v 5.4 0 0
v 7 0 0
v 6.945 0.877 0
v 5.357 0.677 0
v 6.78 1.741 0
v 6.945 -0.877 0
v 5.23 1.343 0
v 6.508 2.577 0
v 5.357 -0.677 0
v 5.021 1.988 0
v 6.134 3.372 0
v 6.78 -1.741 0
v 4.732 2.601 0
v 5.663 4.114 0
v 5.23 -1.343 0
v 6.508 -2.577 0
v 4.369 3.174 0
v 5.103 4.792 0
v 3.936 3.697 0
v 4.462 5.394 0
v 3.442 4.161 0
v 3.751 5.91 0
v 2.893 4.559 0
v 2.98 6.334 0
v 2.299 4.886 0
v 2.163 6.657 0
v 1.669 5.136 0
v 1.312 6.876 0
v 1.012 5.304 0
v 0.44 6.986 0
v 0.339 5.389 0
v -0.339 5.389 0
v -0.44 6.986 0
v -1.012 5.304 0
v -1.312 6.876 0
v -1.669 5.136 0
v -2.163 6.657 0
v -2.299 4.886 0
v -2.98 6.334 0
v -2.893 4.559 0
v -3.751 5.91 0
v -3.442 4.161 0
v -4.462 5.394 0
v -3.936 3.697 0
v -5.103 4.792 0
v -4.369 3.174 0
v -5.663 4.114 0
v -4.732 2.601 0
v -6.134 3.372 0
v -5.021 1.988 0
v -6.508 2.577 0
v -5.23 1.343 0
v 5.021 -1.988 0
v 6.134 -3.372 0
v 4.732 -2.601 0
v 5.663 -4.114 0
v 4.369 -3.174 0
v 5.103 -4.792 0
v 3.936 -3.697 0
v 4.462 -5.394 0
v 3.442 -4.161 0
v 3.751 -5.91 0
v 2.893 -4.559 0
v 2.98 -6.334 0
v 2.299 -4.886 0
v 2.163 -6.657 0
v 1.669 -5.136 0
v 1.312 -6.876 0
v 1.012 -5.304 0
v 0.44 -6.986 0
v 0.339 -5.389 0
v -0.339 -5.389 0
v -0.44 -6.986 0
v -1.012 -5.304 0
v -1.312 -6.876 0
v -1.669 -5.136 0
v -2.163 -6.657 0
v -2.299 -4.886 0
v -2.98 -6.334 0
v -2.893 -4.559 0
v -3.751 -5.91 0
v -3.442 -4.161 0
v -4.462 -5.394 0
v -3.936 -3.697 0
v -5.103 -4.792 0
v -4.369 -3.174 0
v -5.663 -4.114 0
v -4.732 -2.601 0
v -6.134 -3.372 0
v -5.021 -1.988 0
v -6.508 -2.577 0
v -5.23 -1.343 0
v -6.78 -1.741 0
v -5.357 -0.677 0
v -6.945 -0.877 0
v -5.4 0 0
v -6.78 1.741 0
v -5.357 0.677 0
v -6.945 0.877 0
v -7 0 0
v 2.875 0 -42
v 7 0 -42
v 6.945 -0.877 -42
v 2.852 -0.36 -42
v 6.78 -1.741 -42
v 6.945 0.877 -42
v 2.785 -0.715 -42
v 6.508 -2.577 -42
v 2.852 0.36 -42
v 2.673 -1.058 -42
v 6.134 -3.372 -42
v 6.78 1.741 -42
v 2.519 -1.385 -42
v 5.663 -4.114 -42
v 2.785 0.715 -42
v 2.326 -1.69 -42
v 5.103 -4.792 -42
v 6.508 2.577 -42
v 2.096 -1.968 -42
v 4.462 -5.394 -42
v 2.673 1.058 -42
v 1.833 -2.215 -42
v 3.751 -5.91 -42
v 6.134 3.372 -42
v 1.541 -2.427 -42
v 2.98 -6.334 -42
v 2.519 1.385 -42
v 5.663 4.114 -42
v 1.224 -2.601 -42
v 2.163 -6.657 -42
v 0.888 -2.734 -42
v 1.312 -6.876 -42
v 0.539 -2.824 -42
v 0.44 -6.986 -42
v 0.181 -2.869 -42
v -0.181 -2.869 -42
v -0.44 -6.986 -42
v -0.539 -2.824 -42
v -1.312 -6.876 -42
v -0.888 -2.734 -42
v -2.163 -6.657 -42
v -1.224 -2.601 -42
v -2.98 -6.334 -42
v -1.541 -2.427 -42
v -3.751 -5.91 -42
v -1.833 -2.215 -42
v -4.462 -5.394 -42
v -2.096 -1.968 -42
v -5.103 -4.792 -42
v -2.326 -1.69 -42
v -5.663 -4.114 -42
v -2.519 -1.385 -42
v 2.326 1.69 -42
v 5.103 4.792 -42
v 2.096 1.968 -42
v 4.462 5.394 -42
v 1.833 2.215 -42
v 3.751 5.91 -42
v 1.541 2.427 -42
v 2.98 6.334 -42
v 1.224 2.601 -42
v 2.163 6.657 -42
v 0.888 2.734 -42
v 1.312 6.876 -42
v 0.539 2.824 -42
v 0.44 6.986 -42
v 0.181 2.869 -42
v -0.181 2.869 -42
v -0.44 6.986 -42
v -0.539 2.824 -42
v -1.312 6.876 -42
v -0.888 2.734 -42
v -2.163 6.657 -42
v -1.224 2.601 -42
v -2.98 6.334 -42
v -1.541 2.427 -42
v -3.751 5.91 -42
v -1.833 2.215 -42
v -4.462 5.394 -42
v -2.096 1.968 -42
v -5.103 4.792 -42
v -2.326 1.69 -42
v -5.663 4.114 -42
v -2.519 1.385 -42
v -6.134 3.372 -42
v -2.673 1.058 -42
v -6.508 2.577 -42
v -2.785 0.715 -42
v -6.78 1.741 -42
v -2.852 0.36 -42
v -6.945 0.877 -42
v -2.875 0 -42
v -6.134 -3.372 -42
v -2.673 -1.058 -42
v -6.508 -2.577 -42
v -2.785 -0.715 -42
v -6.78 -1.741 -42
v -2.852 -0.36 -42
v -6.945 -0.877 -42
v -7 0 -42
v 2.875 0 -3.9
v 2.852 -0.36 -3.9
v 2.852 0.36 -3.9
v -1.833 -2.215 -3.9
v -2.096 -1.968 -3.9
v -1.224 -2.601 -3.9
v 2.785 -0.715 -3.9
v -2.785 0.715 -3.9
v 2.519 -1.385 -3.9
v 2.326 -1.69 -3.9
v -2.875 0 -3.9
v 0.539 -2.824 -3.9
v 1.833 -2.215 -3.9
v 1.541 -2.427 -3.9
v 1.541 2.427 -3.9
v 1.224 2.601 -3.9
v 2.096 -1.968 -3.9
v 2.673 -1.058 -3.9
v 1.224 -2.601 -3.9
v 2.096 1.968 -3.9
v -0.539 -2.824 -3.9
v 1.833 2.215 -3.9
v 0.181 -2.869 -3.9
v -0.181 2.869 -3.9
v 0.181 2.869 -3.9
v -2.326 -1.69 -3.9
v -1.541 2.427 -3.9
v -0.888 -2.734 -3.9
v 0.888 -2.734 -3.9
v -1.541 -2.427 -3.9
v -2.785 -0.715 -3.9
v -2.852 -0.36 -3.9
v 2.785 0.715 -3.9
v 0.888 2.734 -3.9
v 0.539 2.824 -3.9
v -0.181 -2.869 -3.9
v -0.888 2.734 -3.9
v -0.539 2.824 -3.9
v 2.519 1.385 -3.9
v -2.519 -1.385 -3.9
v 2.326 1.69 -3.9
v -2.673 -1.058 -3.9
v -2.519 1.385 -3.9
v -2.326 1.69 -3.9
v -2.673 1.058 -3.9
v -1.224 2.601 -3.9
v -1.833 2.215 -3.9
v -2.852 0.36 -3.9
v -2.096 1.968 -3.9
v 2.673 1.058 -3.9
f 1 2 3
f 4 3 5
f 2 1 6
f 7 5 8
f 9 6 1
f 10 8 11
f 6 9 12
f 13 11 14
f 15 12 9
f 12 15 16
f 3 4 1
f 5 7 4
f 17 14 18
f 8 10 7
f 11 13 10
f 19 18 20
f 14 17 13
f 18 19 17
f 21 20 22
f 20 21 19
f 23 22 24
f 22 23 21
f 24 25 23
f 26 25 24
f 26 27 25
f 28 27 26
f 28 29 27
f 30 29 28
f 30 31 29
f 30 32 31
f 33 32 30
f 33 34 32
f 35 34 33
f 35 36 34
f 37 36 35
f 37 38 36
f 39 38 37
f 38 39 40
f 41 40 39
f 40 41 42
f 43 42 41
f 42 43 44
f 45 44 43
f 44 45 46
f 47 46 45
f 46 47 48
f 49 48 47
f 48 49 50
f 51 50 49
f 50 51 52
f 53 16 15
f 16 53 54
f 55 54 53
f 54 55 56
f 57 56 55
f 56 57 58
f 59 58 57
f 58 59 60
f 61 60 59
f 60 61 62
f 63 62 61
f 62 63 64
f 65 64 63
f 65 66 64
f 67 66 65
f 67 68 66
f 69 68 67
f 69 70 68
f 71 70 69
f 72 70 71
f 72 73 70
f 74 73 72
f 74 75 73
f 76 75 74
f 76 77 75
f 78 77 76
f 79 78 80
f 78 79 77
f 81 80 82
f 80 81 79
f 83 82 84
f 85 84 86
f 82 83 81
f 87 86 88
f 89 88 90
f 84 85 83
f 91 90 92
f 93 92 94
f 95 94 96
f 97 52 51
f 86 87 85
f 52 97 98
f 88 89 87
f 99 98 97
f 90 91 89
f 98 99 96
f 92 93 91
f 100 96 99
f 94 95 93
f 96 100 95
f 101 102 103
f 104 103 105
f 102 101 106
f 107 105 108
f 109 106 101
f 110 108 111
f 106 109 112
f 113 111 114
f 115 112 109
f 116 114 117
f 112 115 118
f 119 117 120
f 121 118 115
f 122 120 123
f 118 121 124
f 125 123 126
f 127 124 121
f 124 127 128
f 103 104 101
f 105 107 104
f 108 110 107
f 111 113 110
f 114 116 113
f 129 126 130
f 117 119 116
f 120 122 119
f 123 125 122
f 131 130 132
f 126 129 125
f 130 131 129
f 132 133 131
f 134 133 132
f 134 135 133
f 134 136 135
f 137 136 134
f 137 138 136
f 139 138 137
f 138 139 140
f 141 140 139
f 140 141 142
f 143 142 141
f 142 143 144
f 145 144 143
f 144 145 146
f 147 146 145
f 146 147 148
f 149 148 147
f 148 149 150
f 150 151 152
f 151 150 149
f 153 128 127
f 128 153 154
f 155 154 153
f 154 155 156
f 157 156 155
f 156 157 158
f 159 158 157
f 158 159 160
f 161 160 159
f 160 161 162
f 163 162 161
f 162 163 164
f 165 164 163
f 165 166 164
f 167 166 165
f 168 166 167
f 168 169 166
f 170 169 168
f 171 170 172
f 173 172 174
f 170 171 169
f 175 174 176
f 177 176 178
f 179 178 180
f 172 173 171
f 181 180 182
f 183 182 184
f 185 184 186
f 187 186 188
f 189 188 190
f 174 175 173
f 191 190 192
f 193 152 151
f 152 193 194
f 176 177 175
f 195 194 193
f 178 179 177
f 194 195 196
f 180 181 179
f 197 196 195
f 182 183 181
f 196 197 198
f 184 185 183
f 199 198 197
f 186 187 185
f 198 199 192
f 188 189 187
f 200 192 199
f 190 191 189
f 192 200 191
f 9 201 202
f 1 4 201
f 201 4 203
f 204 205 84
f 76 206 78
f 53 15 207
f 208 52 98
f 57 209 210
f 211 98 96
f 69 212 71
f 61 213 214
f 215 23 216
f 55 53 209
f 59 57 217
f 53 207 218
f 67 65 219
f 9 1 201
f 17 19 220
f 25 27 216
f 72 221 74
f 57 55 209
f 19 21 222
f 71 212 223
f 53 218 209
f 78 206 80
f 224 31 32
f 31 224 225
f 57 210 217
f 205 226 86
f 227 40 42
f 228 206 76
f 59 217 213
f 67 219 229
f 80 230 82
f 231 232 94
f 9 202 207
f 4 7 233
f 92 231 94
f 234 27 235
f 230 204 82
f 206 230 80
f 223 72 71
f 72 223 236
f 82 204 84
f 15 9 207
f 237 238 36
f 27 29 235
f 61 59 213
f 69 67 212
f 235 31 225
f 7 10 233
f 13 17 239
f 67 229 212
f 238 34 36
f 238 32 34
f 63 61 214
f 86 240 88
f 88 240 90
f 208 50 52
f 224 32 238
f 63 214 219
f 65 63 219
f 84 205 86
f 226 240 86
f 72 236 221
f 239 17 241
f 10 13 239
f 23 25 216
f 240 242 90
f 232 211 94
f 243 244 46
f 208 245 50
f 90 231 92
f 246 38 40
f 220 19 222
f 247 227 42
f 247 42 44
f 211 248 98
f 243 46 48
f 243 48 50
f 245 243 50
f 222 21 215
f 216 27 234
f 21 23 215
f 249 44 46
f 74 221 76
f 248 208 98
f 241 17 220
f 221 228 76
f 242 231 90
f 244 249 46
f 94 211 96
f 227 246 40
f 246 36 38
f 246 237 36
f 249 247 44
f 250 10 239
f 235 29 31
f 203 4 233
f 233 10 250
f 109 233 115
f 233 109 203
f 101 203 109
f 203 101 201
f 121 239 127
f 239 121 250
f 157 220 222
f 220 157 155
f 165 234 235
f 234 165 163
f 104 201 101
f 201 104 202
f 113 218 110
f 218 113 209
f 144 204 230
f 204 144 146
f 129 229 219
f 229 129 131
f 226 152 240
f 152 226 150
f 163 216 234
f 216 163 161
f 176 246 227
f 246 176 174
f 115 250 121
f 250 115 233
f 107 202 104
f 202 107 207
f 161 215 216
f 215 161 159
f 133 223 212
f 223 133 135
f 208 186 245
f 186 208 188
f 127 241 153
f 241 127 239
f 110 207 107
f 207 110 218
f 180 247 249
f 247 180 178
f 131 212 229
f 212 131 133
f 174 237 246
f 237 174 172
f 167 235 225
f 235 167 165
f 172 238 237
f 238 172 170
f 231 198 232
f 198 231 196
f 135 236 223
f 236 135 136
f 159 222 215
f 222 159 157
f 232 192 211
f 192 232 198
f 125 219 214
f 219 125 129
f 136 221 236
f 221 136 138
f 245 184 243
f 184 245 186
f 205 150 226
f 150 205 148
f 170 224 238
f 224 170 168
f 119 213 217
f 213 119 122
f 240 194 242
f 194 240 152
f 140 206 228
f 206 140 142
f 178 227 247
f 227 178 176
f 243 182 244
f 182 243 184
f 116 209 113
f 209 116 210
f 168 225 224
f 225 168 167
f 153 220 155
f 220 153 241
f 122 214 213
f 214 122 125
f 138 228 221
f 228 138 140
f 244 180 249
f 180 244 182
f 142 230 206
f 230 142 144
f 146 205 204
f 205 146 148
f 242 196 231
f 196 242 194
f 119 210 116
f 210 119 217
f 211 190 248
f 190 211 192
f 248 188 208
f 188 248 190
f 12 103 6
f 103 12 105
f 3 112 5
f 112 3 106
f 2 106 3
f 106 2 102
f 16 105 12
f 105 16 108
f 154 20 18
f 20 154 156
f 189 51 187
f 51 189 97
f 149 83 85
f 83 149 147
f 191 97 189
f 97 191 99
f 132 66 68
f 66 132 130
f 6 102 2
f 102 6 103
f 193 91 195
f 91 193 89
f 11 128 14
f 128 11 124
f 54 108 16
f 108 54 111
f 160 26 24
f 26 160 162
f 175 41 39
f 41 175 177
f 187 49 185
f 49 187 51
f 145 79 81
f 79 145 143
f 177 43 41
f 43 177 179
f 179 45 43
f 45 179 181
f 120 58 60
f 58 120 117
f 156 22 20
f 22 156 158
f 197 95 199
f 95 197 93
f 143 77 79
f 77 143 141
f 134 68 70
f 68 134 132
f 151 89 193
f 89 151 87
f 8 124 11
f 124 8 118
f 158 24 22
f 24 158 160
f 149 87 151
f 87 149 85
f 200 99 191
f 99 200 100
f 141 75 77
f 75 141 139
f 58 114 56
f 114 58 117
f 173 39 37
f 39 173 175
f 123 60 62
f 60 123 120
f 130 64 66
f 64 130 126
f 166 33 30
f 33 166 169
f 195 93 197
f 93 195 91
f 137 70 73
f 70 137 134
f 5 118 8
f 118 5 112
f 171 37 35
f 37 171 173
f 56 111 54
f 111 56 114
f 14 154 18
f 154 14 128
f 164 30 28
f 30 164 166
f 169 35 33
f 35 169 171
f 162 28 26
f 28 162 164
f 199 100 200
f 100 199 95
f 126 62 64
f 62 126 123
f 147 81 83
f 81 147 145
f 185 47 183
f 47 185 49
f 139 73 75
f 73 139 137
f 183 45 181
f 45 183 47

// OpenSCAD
$fn = 50;


difference() {
	union() {
		translate(v = [0, 0, -42.0000000000]) {
			cylinder(h = 42, r = 7.0000000000);
		}
		cylinder(h = 0, r = 13.0000000000);
	}
	union() {
		translate(v = [0, 0, 0]) {
			rotate(a = [0, 0, 0]) {
				difference() {
					union() {
						#translate(v = [0, 0, -42.0000000000]) {
							cylinder(h = 42, r = 2.6000000000);
						}
						#translate(v = [0, 0, -3.9000000000]) {
							cylinder(h = 3.9000000000, r1 = 2.8750000000, r2 = 5.4000000000);
						}
						#translate(v = [0, 0, -42.0000000000]) {
							cylinder(h = 42, r = 2.8750000000);
						}
						#translate(v = [0, 0, -42.0000000000]) {
							cylinder(h = 42, r = 2.6000000000);
						}
					}
					union();
				}
			}
		}
	}
}
